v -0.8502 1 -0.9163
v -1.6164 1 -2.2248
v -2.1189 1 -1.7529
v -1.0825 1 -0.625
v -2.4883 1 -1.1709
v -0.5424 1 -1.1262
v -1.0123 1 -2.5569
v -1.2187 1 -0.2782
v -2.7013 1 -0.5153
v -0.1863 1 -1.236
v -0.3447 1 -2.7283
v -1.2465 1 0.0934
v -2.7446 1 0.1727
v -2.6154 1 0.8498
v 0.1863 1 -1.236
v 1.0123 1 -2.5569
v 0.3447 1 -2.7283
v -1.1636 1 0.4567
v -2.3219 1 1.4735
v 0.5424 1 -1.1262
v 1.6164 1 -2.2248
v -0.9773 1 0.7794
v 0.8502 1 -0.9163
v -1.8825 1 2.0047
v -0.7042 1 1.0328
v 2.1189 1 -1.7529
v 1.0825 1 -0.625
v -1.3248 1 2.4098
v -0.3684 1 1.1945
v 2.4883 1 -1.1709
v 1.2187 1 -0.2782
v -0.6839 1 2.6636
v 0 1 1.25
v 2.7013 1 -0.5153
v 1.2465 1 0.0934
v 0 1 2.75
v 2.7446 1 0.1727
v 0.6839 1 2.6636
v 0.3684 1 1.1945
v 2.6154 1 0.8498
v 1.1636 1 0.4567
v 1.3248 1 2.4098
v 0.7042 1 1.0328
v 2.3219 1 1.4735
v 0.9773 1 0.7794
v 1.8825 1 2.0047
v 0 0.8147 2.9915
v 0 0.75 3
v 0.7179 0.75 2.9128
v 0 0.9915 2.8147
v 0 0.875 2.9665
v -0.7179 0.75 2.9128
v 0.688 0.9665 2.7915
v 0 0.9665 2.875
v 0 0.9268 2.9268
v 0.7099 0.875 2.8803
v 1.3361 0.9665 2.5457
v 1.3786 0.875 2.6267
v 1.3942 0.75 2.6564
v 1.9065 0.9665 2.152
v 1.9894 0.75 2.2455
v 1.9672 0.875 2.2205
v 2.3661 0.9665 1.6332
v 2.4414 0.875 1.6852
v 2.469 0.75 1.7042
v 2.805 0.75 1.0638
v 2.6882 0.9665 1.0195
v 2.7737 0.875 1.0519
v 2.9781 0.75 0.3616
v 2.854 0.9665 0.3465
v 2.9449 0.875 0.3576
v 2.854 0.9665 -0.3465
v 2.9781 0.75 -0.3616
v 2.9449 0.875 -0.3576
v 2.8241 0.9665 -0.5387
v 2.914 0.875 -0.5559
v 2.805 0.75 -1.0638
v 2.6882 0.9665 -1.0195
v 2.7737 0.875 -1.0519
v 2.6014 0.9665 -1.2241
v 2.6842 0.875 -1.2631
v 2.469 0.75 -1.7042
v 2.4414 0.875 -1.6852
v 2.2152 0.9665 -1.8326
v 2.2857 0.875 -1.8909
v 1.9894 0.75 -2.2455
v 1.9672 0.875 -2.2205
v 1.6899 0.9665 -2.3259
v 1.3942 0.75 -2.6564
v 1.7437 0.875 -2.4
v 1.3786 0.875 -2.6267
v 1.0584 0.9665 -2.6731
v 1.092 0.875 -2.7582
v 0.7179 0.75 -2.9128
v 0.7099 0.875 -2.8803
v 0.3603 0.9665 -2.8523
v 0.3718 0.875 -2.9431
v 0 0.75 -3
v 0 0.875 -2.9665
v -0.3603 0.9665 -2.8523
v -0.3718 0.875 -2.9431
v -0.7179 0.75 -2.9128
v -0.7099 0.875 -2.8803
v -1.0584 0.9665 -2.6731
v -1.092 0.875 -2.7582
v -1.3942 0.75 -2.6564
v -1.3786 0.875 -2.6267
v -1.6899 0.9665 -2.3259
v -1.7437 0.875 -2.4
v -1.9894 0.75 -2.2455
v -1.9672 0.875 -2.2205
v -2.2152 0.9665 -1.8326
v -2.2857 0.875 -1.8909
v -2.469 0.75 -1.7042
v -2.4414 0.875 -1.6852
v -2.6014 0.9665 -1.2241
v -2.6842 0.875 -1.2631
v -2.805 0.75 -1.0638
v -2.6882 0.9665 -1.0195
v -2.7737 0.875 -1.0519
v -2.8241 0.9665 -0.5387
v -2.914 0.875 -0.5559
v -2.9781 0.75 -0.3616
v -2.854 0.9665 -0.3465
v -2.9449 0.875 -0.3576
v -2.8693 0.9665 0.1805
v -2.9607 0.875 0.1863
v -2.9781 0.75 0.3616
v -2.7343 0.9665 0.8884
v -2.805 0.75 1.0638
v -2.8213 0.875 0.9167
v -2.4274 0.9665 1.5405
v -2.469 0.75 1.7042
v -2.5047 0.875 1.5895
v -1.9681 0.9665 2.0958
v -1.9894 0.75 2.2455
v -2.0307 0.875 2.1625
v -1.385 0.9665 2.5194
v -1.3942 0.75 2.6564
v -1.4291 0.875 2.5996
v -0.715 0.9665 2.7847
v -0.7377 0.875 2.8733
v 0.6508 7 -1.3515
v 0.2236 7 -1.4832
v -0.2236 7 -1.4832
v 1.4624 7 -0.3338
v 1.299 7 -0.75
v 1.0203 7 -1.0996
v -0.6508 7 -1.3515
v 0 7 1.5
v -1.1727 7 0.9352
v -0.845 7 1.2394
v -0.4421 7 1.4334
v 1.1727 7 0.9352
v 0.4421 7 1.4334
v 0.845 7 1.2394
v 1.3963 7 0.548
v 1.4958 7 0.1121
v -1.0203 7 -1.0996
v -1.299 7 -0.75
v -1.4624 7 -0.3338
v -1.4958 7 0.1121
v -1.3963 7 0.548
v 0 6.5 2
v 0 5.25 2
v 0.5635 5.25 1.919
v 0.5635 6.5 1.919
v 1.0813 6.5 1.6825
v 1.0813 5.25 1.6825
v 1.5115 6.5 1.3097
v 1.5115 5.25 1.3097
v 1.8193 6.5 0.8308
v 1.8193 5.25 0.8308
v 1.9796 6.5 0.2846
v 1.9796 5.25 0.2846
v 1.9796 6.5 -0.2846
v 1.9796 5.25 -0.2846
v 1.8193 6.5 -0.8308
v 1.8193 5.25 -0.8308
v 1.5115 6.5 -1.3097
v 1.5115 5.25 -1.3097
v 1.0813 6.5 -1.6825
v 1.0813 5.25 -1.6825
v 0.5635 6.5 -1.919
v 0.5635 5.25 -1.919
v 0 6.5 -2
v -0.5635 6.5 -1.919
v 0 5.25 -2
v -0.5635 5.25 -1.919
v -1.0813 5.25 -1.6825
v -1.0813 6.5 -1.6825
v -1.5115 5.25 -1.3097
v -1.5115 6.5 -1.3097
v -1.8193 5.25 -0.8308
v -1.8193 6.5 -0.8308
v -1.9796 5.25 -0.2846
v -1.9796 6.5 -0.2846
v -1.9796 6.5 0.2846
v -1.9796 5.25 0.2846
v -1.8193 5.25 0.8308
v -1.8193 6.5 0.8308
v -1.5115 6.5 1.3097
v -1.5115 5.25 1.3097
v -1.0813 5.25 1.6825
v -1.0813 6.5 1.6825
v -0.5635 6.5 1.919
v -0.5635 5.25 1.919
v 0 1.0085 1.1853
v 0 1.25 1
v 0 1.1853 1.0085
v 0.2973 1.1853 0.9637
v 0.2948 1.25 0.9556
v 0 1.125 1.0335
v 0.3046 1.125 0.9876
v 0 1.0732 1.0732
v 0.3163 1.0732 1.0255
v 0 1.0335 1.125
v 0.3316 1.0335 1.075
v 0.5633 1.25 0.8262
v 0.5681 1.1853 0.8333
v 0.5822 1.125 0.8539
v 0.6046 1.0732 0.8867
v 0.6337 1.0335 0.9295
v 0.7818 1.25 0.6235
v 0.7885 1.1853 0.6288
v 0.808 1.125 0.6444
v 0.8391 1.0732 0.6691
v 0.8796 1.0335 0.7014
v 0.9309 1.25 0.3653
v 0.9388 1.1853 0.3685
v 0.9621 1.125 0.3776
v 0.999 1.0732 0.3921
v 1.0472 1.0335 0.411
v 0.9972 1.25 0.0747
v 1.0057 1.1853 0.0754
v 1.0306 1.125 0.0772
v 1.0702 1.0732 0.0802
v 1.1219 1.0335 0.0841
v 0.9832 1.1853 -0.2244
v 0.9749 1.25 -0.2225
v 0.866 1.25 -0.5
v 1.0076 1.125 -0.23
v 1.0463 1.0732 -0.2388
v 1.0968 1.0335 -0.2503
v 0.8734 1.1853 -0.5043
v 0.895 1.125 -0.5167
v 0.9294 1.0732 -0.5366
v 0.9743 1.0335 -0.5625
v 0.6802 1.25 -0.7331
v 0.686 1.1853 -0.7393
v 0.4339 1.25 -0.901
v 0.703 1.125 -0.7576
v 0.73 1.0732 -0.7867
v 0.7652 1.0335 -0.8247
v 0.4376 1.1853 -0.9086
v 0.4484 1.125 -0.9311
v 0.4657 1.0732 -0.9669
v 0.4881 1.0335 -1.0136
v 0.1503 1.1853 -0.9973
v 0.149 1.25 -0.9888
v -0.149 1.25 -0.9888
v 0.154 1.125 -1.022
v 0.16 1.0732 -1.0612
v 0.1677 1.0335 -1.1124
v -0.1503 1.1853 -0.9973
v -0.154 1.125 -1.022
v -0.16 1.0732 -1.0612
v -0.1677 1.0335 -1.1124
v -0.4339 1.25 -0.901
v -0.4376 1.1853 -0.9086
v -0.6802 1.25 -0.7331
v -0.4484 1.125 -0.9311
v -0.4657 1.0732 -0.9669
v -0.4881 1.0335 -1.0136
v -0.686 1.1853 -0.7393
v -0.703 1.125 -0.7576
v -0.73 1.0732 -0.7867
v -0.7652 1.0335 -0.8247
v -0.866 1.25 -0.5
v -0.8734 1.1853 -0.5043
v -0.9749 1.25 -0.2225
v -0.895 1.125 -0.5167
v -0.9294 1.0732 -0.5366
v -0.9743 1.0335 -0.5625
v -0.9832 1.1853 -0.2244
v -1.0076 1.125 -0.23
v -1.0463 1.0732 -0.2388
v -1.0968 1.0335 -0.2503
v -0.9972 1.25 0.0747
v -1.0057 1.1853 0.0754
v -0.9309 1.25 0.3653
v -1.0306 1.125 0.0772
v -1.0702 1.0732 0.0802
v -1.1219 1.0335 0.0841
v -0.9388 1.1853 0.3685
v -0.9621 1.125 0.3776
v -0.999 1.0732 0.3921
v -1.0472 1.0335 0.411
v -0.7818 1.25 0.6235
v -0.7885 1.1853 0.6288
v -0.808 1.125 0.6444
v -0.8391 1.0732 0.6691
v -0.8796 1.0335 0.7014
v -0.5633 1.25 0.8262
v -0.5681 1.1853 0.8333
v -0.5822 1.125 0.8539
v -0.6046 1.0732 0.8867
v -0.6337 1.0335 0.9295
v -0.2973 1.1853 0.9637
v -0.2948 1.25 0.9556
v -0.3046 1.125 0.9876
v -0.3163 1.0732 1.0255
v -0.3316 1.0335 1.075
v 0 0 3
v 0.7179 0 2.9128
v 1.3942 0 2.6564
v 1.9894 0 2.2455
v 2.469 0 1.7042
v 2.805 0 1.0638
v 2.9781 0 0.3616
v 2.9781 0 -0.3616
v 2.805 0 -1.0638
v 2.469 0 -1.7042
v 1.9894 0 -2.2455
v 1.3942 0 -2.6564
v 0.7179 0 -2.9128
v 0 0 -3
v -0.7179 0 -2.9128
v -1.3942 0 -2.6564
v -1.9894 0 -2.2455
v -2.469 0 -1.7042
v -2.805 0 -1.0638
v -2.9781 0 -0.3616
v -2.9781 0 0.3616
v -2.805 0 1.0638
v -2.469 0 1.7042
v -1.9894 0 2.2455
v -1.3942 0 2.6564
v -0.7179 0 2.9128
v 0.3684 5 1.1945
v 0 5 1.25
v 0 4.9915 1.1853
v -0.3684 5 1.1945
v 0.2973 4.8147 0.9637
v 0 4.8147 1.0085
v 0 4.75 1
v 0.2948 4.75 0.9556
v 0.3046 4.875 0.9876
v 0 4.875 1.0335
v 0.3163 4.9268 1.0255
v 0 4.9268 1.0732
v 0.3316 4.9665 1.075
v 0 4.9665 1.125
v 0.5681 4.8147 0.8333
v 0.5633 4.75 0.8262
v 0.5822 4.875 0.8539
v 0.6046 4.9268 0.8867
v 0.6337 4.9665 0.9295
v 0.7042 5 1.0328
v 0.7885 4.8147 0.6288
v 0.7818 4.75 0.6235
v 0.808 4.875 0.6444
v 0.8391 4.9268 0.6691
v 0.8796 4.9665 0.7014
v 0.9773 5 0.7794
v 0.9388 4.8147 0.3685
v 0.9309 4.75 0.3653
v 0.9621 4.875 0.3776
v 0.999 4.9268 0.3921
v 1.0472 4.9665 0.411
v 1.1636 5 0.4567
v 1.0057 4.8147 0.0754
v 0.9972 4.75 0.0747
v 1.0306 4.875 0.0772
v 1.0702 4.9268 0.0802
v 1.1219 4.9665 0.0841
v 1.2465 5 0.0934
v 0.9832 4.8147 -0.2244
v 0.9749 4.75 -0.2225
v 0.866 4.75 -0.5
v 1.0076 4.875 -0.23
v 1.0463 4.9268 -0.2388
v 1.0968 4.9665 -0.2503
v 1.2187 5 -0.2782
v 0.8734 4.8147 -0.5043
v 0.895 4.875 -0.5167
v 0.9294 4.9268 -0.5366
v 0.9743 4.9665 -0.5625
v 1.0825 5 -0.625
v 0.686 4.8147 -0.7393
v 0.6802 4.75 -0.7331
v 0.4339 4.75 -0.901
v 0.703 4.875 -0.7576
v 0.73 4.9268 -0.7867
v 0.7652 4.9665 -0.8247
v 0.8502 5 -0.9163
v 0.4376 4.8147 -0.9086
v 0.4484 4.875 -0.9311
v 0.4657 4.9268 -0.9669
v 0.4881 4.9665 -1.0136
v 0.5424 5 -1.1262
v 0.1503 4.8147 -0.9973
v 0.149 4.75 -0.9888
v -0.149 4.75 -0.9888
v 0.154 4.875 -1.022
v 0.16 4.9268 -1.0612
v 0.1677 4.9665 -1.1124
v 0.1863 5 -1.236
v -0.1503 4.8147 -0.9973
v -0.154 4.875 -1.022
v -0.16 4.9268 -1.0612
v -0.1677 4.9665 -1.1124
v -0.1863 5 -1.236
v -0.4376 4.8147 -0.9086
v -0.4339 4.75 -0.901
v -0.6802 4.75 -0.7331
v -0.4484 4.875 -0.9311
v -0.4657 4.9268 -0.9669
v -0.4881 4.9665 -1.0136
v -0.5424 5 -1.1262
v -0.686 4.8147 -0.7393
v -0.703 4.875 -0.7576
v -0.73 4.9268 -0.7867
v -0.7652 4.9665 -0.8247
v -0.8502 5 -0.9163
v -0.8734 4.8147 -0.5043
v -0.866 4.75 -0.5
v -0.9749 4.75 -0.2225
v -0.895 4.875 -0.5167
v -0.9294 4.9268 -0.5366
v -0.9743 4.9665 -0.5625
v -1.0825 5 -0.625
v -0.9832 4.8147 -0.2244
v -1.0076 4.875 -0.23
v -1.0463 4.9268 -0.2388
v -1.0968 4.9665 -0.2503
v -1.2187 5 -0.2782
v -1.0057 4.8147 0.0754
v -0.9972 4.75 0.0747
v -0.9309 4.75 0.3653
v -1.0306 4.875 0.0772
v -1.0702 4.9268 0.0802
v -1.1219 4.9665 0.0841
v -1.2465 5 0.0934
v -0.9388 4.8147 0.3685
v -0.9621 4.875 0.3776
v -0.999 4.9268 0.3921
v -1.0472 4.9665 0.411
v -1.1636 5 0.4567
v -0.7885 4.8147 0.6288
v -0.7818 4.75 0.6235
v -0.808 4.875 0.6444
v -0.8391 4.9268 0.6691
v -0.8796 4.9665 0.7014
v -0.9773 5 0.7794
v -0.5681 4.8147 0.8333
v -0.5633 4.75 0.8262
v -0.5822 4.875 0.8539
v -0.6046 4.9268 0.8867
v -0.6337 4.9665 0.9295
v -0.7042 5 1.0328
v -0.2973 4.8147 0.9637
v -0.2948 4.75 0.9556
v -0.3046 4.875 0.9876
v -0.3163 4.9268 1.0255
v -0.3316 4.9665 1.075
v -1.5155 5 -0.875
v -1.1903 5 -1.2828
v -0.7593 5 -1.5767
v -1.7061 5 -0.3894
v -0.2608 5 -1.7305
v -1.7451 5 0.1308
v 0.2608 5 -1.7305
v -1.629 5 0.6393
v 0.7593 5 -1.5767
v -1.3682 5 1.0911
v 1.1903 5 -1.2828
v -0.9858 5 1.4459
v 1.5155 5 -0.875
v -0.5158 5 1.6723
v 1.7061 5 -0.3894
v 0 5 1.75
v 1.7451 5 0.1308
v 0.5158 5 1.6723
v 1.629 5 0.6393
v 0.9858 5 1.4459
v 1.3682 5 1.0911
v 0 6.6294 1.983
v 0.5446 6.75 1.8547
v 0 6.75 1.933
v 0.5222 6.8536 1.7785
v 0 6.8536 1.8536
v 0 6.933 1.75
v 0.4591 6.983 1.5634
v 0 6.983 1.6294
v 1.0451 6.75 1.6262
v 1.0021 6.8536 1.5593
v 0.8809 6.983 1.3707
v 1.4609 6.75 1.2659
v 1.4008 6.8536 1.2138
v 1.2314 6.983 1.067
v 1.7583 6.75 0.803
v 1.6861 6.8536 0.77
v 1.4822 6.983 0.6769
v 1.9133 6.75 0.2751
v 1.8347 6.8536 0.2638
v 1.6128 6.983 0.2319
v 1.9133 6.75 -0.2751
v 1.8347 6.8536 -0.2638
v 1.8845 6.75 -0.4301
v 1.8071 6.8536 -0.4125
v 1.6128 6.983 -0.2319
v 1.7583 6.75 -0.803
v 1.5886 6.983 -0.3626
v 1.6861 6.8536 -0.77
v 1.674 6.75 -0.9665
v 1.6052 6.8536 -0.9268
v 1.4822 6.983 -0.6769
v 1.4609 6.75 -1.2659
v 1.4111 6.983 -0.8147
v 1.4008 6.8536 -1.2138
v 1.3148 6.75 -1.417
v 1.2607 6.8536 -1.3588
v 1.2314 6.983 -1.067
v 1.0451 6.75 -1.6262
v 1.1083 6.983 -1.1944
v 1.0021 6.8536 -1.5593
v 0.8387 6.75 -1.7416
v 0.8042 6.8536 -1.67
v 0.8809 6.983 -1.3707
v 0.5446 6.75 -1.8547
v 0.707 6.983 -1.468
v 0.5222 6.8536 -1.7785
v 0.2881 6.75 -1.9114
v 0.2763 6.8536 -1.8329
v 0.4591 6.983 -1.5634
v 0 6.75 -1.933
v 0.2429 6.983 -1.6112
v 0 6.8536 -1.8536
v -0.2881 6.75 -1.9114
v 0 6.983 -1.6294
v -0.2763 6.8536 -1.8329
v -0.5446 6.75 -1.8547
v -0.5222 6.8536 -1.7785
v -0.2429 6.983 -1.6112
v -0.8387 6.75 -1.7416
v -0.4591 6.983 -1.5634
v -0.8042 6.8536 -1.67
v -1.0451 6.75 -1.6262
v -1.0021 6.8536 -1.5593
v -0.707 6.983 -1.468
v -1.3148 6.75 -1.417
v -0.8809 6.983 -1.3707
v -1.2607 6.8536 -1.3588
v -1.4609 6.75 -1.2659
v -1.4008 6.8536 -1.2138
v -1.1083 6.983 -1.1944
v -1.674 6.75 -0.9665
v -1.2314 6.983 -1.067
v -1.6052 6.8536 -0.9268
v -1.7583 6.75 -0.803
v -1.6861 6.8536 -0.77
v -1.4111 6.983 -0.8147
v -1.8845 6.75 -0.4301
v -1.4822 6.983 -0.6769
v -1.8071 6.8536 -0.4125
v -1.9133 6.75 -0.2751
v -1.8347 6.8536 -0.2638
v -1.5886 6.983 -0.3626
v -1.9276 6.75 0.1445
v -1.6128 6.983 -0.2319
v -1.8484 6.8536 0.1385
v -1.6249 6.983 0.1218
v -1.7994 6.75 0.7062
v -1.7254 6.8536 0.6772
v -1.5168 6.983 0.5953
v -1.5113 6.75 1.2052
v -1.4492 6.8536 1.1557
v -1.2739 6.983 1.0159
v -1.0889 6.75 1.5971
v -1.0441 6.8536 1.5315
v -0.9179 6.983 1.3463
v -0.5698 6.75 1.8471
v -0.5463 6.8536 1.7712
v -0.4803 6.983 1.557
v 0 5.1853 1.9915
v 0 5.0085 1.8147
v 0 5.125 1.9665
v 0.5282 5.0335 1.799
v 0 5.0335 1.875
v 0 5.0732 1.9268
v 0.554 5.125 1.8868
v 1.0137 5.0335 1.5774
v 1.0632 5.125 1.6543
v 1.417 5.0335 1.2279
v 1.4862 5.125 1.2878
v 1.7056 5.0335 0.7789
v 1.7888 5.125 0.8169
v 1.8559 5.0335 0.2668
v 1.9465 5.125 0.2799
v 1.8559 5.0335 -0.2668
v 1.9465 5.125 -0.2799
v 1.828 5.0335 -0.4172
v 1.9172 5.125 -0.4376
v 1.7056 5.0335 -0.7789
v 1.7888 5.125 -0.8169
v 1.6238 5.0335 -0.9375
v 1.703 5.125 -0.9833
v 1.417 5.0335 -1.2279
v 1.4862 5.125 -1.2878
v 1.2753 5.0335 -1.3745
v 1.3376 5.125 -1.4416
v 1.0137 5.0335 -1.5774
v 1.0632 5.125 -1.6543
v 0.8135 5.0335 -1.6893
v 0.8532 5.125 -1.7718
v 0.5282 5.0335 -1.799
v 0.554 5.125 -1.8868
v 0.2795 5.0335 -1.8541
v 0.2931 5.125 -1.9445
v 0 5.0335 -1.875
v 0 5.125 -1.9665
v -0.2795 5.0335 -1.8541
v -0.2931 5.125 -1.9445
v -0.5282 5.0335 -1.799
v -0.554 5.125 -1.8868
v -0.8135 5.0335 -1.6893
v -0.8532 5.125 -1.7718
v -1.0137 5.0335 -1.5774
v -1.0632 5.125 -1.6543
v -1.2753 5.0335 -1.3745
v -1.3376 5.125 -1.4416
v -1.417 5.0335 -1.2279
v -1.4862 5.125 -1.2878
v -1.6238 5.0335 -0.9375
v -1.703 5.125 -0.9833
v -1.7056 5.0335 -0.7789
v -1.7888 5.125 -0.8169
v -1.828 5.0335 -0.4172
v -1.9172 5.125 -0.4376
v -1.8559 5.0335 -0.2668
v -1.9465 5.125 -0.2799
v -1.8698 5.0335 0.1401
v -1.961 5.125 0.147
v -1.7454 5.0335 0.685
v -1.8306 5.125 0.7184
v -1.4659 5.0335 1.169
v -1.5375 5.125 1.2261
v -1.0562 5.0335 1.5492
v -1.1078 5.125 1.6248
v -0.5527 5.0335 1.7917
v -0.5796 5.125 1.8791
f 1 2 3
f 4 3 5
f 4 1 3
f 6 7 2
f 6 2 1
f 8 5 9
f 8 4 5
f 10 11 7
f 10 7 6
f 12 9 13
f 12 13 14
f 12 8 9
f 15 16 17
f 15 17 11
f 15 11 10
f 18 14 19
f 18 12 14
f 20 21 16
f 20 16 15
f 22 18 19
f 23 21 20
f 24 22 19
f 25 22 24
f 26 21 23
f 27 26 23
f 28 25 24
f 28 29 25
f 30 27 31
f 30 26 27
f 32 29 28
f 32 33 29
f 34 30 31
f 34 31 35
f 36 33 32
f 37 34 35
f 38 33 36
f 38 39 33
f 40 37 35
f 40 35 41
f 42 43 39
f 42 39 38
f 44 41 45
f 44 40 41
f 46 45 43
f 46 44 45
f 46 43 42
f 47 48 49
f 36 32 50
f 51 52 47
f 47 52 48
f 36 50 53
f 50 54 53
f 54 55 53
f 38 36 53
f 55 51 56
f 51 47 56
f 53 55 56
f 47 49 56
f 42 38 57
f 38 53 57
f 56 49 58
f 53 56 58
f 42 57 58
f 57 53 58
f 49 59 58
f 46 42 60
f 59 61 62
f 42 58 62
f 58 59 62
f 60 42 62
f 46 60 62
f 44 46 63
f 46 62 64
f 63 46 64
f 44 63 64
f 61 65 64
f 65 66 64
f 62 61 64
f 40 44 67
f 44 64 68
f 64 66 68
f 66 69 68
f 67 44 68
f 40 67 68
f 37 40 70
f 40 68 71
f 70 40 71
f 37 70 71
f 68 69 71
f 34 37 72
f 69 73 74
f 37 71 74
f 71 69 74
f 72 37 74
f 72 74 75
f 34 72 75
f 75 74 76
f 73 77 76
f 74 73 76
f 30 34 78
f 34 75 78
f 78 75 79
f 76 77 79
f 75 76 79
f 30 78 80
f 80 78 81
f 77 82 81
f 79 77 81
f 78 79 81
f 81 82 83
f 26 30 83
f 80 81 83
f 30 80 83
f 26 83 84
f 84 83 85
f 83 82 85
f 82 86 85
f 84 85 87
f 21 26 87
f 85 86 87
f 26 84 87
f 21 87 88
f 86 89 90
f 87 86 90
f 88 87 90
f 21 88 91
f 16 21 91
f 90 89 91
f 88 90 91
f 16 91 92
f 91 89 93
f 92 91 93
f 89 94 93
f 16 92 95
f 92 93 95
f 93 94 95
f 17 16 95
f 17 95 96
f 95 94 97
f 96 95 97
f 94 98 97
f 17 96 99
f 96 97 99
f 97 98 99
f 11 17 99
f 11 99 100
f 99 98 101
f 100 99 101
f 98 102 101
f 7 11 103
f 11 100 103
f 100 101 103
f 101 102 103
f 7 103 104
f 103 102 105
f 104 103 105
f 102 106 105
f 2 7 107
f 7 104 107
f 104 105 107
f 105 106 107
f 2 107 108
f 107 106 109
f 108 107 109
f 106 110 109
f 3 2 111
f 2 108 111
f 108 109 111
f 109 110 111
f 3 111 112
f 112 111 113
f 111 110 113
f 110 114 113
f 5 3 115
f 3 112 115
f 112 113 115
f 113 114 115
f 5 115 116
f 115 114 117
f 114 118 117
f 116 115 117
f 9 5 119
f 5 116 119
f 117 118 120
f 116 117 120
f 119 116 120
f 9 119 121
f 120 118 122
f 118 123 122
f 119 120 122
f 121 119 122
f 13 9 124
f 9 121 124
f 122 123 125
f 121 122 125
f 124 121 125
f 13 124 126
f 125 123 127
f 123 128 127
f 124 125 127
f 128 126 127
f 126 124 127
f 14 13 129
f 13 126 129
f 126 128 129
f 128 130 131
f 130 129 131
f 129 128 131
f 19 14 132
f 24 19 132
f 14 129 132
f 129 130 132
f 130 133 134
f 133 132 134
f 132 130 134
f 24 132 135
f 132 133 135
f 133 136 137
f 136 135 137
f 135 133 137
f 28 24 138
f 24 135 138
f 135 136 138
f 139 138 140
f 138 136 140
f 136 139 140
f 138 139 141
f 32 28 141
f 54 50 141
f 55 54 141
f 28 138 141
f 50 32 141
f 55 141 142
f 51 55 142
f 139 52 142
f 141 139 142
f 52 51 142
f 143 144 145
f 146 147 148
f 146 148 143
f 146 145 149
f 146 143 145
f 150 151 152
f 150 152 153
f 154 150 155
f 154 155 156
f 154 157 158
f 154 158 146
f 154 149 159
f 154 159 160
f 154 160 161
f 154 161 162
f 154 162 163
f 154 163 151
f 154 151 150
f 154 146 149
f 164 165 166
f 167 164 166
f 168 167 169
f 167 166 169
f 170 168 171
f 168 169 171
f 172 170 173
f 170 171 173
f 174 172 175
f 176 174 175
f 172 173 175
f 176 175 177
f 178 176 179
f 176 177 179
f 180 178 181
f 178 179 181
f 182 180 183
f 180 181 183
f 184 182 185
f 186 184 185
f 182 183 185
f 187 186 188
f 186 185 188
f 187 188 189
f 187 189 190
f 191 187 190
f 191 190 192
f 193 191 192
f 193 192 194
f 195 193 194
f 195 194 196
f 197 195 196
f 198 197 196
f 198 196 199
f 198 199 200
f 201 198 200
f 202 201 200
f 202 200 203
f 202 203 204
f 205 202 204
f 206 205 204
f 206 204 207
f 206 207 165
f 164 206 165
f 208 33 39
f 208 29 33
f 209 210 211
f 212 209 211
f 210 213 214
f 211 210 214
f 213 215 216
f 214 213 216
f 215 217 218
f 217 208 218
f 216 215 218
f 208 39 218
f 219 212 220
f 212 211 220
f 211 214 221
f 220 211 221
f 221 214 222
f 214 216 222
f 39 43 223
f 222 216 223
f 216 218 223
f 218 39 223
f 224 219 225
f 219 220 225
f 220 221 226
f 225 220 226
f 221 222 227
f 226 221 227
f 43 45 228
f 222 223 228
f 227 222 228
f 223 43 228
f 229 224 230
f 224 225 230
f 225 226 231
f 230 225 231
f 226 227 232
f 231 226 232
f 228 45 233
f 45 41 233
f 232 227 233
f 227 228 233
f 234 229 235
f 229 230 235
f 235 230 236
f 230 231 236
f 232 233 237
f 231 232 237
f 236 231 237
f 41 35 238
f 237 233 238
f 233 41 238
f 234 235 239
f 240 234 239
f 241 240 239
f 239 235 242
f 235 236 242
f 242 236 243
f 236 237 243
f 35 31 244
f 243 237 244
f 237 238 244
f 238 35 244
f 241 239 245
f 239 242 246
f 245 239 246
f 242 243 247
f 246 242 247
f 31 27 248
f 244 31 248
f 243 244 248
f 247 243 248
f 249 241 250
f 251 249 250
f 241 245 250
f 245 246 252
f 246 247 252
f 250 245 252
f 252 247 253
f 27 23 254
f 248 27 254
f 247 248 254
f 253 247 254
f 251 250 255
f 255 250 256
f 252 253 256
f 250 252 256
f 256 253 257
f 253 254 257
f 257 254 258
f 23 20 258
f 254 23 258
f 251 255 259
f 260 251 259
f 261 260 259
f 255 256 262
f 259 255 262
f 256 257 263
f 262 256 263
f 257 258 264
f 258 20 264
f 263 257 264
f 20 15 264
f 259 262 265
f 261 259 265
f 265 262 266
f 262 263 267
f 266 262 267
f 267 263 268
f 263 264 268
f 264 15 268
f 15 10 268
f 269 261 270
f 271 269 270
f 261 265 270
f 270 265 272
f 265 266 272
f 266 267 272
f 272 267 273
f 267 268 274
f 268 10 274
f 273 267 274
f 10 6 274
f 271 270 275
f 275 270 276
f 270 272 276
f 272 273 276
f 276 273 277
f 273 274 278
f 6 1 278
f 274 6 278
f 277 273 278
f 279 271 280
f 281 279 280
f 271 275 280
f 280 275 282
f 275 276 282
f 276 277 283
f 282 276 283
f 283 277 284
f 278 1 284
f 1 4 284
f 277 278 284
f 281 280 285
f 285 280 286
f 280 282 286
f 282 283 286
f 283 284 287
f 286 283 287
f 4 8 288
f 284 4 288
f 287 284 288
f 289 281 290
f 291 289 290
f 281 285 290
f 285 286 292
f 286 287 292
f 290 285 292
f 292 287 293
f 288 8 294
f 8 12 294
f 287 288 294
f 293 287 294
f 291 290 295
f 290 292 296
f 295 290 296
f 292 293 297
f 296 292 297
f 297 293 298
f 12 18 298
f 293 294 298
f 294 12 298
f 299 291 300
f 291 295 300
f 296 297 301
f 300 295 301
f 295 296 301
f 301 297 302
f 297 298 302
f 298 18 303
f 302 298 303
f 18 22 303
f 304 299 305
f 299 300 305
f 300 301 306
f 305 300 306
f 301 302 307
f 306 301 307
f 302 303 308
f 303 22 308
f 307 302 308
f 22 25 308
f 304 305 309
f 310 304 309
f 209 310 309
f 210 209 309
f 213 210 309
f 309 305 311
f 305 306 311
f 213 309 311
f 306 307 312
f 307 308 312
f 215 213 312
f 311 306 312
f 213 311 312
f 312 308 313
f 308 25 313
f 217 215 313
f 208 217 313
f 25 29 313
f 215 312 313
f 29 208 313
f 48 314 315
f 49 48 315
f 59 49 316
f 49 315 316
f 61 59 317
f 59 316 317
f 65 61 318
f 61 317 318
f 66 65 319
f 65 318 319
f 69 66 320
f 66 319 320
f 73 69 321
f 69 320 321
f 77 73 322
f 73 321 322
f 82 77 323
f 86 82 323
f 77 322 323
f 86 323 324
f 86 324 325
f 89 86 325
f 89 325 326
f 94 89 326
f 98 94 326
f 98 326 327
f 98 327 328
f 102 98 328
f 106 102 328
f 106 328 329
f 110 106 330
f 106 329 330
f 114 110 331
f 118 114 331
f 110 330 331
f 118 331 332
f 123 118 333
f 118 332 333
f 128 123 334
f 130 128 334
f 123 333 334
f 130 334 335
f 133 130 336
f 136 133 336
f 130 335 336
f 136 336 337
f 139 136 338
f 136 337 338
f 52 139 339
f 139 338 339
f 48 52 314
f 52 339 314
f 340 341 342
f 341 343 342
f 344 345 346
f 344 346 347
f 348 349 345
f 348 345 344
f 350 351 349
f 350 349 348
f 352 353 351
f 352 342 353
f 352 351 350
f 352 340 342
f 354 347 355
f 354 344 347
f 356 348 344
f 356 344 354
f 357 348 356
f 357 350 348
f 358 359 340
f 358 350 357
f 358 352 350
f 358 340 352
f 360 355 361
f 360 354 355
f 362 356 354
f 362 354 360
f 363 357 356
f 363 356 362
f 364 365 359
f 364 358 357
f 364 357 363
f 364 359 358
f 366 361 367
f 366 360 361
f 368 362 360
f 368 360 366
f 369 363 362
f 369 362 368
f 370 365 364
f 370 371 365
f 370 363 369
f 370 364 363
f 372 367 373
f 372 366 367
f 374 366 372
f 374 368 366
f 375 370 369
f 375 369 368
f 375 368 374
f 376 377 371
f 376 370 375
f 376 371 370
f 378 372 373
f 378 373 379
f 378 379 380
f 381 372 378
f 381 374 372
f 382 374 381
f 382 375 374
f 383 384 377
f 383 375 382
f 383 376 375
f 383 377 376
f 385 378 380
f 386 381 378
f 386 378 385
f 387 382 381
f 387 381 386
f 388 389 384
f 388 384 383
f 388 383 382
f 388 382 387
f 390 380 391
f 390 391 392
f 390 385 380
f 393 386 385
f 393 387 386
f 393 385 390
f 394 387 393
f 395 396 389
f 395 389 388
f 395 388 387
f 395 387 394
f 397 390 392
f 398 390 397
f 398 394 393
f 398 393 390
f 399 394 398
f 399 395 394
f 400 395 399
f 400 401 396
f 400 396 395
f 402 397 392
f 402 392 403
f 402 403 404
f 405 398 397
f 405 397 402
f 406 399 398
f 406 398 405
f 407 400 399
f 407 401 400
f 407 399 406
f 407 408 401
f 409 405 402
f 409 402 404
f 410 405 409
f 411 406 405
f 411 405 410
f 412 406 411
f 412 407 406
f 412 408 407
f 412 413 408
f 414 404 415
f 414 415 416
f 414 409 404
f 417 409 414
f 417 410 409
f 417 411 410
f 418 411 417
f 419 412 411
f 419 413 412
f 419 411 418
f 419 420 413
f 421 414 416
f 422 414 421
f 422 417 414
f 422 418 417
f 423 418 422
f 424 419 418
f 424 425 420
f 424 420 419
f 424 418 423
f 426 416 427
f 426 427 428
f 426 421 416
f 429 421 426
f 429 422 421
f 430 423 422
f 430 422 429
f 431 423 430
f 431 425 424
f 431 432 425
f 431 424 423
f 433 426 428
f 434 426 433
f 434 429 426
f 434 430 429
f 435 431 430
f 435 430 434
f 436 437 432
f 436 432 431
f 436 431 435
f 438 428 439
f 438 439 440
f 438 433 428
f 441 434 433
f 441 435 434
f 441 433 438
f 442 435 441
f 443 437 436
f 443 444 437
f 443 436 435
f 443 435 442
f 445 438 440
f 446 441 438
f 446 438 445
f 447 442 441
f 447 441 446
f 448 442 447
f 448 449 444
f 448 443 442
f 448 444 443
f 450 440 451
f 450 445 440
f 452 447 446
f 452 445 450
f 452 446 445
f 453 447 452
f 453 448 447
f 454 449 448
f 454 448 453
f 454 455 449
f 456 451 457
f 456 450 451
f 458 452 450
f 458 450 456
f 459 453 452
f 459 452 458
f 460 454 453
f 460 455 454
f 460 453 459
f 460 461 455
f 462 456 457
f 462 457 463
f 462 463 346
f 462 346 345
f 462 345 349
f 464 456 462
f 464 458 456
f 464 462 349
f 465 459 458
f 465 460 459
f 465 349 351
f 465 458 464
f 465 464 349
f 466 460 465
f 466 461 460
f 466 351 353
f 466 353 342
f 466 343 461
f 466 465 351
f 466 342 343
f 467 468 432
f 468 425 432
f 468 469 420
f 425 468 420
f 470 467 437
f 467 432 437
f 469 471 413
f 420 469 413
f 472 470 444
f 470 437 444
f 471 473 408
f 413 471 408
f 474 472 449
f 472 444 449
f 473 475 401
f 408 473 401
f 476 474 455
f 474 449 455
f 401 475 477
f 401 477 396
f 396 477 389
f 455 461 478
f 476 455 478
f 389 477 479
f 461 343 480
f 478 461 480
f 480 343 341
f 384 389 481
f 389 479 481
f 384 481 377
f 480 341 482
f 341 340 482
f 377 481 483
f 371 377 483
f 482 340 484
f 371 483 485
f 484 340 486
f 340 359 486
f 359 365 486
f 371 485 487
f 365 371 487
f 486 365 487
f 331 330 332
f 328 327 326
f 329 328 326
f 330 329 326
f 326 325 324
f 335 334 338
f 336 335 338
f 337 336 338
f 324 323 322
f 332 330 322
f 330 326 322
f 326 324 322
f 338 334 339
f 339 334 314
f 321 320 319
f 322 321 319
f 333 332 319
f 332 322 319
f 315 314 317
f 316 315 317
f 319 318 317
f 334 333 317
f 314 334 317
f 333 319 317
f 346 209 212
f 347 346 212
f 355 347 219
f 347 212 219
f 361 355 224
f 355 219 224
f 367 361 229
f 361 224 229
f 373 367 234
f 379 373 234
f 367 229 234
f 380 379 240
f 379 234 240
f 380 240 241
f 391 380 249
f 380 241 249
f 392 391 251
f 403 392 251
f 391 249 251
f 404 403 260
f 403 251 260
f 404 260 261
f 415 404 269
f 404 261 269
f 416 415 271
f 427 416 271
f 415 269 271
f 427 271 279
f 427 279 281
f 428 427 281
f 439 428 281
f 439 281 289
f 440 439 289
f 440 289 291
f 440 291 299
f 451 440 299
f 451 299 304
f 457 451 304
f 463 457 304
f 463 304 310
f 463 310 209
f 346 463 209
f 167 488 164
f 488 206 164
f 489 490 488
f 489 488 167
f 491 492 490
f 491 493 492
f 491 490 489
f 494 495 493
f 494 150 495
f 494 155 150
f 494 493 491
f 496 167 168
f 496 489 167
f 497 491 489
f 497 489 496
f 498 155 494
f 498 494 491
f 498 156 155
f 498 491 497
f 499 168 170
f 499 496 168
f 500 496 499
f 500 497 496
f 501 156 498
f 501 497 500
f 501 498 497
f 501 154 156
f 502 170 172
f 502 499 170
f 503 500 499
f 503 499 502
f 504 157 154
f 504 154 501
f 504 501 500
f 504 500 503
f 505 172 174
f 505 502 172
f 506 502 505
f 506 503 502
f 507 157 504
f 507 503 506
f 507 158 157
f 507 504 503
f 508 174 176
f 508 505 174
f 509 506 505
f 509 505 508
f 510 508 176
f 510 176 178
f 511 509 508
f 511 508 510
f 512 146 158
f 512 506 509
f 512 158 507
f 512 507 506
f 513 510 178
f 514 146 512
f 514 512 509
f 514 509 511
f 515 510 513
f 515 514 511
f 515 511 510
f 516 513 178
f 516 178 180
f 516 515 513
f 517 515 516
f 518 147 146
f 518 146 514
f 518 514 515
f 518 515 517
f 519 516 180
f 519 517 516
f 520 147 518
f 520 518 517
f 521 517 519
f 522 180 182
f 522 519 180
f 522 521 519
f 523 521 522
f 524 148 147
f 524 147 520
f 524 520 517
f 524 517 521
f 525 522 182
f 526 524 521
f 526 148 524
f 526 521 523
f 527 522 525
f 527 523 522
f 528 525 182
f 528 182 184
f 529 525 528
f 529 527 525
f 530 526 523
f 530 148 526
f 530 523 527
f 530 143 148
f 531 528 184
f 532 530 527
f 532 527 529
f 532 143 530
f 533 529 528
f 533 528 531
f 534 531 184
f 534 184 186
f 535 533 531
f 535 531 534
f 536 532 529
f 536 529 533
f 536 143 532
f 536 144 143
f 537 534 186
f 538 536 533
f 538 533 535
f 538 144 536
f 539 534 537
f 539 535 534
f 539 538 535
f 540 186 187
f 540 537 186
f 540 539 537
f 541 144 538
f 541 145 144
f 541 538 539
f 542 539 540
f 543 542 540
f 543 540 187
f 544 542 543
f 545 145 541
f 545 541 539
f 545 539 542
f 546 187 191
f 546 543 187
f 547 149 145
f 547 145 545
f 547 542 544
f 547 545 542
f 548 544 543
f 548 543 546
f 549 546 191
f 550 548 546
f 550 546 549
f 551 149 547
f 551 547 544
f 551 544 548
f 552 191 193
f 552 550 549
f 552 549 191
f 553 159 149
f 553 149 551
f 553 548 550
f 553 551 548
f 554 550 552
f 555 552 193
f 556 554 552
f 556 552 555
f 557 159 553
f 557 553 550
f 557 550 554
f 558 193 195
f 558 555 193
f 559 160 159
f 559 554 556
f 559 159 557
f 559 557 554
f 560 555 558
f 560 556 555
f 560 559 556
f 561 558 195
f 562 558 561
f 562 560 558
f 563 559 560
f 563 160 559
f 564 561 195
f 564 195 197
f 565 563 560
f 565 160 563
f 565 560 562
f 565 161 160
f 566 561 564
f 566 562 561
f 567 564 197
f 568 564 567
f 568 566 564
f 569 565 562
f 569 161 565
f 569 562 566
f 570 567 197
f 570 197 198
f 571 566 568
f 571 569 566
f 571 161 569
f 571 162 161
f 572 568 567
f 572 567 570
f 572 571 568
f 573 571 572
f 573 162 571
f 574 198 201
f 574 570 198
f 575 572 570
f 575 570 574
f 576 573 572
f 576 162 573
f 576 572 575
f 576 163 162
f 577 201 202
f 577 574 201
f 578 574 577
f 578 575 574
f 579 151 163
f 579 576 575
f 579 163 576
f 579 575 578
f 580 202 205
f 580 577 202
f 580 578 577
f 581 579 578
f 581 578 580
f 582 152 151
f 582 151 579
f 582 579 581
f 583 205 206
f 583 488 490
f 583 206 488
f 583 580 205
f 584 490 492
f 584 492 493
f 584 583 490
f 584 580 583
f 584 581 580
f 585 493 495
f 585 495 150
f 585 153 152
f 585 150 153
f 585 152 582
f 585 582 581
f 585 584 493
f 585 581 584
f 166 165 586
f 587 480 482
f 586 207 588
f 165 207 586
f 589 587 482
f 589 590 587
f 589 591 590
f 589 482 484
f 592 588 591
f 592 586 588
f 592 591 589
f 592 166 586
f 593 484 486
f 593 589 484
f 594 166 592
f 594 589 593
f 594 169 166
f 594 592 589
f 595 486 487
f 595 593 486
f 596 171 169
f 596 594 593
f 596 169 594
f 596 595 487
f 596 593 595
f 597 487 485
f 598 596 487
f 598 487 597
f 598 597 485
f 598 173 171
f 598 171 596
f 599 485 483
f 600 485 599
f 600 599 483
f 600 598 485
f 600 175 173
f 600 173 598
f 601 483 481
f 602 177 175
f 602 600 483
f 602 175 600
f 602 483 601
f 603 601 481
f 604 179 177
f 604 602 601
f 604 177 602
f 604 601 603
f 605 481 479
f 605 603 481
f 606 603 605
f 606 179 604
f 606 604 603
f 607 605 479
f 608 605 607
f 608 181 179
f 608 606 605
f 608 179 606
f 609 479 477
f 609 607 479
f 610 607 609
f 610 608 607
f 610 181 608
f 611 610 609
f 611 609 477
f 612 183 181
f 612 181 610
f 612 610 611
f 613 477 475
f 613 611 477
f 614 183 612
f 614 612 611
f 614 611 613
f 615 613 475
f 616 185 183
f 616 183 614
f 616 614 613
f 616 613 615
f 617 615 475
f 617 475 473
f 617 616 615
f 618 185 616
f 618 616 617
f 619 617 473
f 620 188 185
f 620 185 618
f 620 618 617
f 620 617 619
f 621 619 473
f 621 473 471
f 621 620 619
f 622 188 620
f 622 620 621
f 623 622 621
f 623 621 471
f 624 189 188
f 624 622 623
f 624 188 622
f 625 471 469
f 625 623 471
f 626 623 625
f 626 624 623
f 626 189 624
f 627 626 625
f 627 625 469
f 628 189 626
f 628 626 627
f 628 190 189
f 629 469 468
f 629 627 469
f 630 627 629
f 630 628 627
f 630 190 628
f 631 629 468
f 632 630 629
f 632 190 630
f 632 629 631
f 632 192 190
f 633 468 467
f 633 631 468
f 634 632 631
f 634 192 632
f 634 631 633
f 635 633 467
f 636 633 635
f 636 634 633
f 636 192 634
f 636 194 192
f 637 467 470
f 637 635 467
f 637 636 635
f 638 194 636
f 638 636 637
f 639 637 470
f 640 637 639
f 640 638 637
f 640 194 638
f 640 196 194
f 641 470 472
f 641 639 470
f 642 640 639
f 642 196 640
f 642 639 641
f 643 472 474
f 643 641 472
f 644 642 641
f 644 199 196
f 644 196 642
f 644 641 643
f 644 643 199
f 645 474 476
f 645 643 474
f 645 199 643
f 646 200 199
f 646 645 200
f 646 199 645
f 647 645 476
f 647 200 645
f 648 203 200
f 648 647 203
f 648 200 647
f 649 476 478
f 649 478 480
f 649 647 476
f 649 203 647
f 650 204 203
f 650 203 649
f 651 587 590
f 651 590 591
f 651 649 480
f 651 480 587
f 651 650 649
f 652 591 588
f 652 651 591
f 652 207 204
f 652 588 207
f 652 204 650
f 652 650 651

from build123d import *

# Parameters (mm, degrees)
SKETCH1_R           = 2
BOSS_EXTRUDE1_DEPTH = 7
SKETCH1_5_R         = 2
SKETCH1_5_R_2       = 1
CUT_EXTRUDE2_DEPTH  = 5
SKETCH1_6_R         = 3
SKETCH1_6_R_2       = 1
BOSS_EXTRUDE3_DEPTH = 1
FILLET2_R           = 0.5
FILLET3_R           = 0.25
FILLET4_R           = 0.25
FILLET5_R           = 0.25


with BuildPart() as part:
    # Sketch1 → Boss-Extrude1 (new body)
    with BuildSketch(Plane(origin=(0, 0, 0), x_dir=(1, 0, 0), z_dir=(0, 1, 0))):
        Circle(SKETCH1_R)
    extrude(amount=BOSS_EXTRUDE1_DEPTH)

    # Sketch1<5> → Cut-Extrude2 (cut)
    with BuildSketch(Plane(origin=(0, 0, 0), x_dir=(1, 0, 0), z_dir=(0, 1, 0))):
        Circle(SKETCH1_5_R)
        Circle(SKETCH1_5_R_2, mode=Mode.SUBTRACT)
    extrude(amount=CUT_EXTRUDE2_DEPTH, mode=Mode.SUBTRACT)

    # Sketch1<6> → Boss-Extrude3 (add)
    with BuildSketch(Plane(origin=(0, 0, 0), x_dir=(1, 0, 0), z_dir=(0, 1, 0))):
        Circle(SKETCH1_6_R)
        Circle(SKETCH1_6_R_2, mode=Mode.SUBTRACT)
    extrude(amount=BOSS_EXTRUDE3_DEPTH)

    # Fillet2
    fillet2_edges = [part.edges().sort_by_distance(p)[0] for p in [
        (-2, 7, 0),
    ]]
    fillet(fillet2_edges, radius=FILLET2_R)

    # Fillet3
    fillet3_edges = [part.edges().sort_by_distance(p)[0] for p in [
        (-3, 1, 0),
    ]]
    fillet(fillet3_edges, radius=FILLET3_R)

    # Fillet4
    fillet4_edges = [part.edges().sort_by_distance(p)[0] for p in [
        (-2, 5, 0),
        (-1, 5, 0),
    ]]
    fillet(fillet4_edges, radius=FILLET4_R)

    # Fillet5
    fillet5_edges = [part.edges().sort_by_distance(p)[0] for p in [
        (-1, 1, 0),
    ]]
    fillet(fillet5_edges, radius=FILLET5_R)


solid = part.part
